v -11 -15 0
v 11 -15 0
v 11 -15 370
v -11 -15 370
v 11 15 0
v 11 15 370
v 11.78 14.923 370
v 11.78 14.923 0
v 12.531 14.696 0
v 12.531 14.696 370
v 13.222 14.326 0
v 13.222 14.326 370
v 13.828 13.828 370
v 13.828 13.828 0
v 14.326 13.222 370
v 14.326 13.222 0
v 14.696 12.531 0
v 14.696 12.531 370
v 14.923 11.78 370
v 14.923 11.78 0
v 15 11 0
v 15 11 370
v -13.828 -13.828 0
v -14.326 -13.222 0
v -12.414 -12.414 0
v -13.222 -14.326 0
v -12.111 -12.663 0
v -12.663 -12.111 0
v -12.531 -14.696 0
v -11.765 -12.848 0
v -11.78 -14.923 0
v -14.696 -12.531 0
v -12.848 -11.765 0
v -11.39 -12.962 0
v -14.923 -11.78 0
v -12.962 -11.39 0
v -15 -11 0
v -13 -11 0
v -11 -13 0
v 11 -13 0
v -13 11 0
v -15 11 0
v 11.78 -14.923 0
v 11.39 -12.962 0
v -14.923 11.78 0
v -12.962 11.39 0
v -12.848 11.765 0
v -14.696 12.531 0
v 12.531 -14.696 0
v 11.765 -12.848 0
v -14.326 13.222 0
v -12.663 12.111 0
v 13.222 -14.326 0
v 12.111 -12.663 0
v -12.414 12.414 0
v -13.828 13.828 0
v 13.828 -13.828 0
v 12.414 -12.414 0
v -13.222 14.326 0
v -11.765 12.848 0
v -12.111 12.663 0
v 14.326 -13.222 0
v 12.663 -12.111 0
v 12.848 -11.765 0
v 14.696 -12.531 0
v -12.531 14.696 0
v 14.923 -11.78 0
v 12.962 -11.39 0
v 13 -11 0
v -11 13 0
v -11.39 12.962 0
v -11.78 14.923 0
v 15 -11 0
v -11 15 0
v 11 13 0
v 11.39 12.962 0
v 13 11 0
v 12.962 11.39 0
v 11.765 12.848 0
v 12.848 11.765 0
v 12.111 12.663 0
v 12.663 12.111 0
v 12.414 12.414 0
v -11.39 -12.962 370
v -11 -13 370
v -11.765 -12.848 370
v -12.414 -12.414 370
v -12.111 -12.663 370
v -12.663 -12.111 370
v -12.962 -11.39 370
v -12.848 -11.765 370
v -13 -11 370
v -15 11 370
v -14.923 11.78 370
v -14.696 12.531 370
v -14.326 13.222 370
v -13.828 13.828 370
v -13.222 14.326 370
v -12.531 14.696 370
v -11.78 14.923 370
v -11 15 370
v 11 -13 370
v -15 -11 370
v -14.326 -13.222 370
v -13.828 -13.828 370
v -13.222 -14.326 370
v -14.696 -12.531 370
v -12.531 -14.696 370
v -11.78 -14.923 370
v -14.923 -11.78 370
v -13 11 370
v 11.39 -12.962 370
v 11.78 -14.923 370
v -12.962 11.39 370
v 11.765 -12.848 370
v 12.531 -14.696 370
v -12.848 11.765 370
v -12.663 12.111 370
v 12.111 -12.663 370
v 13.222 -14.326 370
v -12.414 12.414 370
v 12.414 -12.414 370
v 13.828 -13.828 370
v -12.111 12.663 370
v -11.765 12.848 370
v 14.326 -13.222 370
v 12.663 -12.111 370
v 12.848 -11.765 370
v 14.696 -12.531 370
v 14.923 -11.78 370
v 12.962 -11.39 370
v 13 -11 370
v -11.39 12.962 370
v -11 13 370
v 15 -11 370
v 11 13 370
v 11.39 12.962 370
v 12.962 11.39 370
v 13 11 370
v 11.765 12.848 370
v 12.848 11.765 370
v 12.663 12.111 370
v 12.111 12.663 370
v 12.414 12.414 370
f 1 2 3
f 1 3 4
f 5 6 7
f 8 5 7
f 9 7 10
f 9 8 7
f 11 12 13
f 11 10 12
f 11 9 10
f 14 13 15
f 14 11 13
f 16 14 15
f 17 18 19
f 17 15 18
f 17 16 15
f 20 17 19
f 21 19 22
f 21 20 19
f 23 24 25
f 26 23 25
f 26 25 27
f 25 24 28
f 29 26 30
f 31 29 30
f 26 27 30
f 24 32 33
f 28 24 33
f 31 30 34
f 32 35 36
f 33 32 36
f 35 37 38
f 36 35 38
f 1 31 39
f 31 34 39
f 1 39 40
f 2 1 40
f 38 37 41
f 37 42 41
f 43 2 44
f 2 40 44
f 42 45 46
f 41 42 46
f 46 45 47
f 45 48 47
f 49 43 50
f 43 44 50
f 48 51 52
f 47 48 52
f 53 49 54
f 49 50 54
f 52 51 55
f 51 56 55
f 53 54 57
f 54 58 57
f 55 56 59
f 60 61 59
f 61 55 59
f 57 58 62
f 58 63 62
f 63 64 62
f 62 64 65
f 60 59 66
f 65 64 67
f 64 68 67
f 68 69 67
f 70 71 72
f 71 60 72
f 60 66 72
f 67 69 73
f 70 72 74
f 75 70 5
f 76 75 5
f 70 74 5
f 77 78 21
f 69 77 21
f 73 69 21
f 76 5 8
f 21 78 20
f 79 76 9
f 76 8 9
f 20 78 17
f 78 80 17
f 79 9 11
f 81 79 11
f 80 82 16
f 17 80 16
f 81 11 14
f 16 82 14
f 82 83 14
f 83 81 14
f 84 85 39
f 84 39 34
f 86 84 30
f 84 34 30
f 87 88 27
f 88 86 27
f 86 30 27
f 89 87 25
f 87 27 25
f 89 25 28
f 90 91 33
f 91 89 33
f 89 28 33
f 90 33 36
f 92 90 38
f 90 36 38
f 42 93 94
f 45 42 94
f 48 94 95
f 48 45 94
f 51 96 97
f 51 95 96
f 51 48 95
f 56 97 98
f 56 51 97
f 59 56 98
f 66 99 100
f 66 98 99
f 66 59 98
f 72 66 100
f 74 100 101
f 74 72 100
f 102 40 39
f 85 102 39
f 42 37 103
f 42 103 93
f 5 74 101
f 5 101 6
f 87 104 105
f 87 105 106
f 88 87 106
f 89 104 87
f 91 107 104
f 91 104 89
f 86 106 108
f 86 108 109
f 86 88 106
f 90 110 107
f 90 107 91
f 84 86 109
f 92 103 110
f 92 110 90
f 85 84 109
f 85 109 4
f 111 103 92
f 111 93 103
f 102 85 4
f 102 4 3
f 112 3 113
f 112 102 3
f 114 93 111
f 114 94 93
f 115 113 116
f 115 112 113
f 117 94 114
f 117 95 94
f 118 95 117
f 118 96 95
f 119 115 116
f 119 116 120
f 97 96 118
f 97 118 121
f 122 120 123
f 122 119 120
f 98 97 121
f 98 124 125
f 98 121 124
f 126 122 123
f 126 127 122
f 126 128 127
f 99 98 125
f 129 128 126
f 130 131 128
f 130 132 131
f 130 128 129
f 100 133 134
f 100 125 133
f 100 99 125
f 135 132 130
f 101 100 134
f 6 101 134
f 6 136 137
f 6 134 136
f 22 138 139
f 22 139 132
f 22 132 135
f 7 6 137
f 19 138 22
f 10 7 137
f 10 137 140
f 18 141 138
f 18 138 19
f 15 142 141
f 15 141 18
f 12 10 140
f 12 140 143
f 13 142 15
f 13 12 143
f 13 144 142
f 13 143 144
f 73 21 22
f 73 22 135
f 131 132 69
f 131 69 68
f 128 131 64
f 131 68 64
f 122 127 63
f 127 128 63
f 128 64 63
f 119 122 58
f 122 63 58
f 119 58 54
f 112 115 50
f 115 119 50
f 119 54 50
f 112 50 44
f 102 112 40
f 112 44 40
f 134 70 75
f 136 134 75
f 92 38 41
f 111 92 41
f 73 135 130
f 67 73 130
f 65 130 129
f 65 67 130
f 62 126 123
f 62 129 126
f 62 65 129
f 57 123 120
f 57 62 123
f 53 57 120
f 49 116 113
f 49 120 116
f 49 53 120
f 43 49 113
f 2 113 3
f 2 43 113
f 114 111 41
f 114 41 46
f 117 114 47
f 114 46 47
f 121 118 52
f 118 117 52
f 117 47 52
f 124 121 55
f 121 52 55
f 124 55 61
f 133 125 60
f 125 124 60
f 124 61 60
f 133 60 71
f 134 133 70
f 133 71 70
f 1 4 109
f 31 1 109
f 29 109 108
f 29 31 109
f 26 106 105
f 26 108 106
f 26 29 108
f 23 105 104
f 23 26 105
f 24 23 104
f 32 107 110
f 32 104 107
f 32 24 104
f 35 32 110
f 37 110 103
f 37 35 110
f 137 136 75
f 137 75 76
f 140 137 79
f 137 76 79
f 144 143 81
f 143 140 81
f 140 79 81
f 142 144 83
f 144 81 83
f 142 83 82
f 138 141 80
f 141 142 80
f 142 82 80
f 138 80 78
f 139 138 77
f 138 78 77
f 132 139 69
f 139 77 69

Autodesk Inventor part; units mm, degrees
ref_plane "YZ Plane" through (0, 0, 0) normal (1, 0, 0) x (0, 1, 0)
ref_plane "Plan de départ" through (0, 0, 0) normal (0, 0, 1) x (1, 0, 0)
ref_plane "Plan de fin" through (0, 0, 370) normal (0, 0, 1) x (1, 0, 0)
sketch "Esquisse" plane through (0, 0, 0) normal (0, 0, 1) x (1, 0, 0)
  line L0 (-15, -11) -> (-15, 11)
  line L1 (-11, 15) -> (11, 15)
  line L2 (15, 11) -> (15, -11)
  line L3 (11, -15) -> (-11, -15)
  arc A0 (-15, -11) -> (-11, -15) centre (-11, -11) ccw
  arc A1 (15, 11) -> (11, 15) centre (11, 11) ccw
  arc A2 (-11, 15) -> (-15, 11) centre (-11, 11) ccw
  arc A3 (11, -15) -> (15, -11) centre (11, -11) ccw
  arc A4 (-11, 13) -> (-13, 11) centre (-11, 11) ccw
  line L4 (-11, 13) -> (11, 13)
  arc A5 (13, 11) -> (11, 13) centre (11, 11) ccw
  line L5 (13, 11) -> (13, -11)
  arc A6 (11, -13) -> (13, -11) centre (11, -11) ccw
  line L6 (11, -13) -> (-11, -13)
  arc A7 (-13, -11) -> (-11, -13) centre (-11, -11) ccw
  line L7 (-13, -11) -> (-13, 11)
  line L8 (0, 22.1598) -> (0, -22.1598) construction
  line L9 (-22.1598, 0) -> (22.1598, 0) construction
  dimension "d7" = 4
  dimension "d9" = 30
  dimension "d11" = 30
  dimension "d12" = 2
  dimension "d15" = 15
  dimension "d16" = 15
extrude "Corps" add sketch "Esquisse" along normal up to surface (370 mm away) from surface at 0
sketch "Sketch3" plane through (0, 0, 0) normal (0, 0, 1) x (1, 0, 0)
  line L0 (0, 0) -> (10, 0)
ref_plane "Work Plane3" through (0, 0, 0) normal (0, -1, 0) x (1, 0, 0)
sketch "Sketch4" plane through (0, 0, 0) normal (0, -1, 0) x (1, 0, 0)
  line L0 (-2, 0) -> (12, 0) projected
  line L1 (-2, 370) -> (12, 370) projected
  dimension "d18" = 370
equation "\"d7\" = G_IR"
equation "\"d9\" = G_W"
equation "\"d11\" = G_H"
equation "\"d12\" = G_T"
equation "\"d15\" = 0.5 * d9"
equation "\"d16\" = 0.5 * d11"
equation "\"d3\" = G_L"
equation "\"G_W\" = 30"
equation "\"G_H\" = 30"
equation "\"G_T\" = 2"
equation "\"G_IR\" = 4"
equation "\"G_L\" = d18"
equation "\"G_OFFSET_START\" = 0"
equation "\"G_OFFSET_END\" = 0"
properties part number "ISO 10799-2 - 30x30x2 - 370" material "Acier, doux"
